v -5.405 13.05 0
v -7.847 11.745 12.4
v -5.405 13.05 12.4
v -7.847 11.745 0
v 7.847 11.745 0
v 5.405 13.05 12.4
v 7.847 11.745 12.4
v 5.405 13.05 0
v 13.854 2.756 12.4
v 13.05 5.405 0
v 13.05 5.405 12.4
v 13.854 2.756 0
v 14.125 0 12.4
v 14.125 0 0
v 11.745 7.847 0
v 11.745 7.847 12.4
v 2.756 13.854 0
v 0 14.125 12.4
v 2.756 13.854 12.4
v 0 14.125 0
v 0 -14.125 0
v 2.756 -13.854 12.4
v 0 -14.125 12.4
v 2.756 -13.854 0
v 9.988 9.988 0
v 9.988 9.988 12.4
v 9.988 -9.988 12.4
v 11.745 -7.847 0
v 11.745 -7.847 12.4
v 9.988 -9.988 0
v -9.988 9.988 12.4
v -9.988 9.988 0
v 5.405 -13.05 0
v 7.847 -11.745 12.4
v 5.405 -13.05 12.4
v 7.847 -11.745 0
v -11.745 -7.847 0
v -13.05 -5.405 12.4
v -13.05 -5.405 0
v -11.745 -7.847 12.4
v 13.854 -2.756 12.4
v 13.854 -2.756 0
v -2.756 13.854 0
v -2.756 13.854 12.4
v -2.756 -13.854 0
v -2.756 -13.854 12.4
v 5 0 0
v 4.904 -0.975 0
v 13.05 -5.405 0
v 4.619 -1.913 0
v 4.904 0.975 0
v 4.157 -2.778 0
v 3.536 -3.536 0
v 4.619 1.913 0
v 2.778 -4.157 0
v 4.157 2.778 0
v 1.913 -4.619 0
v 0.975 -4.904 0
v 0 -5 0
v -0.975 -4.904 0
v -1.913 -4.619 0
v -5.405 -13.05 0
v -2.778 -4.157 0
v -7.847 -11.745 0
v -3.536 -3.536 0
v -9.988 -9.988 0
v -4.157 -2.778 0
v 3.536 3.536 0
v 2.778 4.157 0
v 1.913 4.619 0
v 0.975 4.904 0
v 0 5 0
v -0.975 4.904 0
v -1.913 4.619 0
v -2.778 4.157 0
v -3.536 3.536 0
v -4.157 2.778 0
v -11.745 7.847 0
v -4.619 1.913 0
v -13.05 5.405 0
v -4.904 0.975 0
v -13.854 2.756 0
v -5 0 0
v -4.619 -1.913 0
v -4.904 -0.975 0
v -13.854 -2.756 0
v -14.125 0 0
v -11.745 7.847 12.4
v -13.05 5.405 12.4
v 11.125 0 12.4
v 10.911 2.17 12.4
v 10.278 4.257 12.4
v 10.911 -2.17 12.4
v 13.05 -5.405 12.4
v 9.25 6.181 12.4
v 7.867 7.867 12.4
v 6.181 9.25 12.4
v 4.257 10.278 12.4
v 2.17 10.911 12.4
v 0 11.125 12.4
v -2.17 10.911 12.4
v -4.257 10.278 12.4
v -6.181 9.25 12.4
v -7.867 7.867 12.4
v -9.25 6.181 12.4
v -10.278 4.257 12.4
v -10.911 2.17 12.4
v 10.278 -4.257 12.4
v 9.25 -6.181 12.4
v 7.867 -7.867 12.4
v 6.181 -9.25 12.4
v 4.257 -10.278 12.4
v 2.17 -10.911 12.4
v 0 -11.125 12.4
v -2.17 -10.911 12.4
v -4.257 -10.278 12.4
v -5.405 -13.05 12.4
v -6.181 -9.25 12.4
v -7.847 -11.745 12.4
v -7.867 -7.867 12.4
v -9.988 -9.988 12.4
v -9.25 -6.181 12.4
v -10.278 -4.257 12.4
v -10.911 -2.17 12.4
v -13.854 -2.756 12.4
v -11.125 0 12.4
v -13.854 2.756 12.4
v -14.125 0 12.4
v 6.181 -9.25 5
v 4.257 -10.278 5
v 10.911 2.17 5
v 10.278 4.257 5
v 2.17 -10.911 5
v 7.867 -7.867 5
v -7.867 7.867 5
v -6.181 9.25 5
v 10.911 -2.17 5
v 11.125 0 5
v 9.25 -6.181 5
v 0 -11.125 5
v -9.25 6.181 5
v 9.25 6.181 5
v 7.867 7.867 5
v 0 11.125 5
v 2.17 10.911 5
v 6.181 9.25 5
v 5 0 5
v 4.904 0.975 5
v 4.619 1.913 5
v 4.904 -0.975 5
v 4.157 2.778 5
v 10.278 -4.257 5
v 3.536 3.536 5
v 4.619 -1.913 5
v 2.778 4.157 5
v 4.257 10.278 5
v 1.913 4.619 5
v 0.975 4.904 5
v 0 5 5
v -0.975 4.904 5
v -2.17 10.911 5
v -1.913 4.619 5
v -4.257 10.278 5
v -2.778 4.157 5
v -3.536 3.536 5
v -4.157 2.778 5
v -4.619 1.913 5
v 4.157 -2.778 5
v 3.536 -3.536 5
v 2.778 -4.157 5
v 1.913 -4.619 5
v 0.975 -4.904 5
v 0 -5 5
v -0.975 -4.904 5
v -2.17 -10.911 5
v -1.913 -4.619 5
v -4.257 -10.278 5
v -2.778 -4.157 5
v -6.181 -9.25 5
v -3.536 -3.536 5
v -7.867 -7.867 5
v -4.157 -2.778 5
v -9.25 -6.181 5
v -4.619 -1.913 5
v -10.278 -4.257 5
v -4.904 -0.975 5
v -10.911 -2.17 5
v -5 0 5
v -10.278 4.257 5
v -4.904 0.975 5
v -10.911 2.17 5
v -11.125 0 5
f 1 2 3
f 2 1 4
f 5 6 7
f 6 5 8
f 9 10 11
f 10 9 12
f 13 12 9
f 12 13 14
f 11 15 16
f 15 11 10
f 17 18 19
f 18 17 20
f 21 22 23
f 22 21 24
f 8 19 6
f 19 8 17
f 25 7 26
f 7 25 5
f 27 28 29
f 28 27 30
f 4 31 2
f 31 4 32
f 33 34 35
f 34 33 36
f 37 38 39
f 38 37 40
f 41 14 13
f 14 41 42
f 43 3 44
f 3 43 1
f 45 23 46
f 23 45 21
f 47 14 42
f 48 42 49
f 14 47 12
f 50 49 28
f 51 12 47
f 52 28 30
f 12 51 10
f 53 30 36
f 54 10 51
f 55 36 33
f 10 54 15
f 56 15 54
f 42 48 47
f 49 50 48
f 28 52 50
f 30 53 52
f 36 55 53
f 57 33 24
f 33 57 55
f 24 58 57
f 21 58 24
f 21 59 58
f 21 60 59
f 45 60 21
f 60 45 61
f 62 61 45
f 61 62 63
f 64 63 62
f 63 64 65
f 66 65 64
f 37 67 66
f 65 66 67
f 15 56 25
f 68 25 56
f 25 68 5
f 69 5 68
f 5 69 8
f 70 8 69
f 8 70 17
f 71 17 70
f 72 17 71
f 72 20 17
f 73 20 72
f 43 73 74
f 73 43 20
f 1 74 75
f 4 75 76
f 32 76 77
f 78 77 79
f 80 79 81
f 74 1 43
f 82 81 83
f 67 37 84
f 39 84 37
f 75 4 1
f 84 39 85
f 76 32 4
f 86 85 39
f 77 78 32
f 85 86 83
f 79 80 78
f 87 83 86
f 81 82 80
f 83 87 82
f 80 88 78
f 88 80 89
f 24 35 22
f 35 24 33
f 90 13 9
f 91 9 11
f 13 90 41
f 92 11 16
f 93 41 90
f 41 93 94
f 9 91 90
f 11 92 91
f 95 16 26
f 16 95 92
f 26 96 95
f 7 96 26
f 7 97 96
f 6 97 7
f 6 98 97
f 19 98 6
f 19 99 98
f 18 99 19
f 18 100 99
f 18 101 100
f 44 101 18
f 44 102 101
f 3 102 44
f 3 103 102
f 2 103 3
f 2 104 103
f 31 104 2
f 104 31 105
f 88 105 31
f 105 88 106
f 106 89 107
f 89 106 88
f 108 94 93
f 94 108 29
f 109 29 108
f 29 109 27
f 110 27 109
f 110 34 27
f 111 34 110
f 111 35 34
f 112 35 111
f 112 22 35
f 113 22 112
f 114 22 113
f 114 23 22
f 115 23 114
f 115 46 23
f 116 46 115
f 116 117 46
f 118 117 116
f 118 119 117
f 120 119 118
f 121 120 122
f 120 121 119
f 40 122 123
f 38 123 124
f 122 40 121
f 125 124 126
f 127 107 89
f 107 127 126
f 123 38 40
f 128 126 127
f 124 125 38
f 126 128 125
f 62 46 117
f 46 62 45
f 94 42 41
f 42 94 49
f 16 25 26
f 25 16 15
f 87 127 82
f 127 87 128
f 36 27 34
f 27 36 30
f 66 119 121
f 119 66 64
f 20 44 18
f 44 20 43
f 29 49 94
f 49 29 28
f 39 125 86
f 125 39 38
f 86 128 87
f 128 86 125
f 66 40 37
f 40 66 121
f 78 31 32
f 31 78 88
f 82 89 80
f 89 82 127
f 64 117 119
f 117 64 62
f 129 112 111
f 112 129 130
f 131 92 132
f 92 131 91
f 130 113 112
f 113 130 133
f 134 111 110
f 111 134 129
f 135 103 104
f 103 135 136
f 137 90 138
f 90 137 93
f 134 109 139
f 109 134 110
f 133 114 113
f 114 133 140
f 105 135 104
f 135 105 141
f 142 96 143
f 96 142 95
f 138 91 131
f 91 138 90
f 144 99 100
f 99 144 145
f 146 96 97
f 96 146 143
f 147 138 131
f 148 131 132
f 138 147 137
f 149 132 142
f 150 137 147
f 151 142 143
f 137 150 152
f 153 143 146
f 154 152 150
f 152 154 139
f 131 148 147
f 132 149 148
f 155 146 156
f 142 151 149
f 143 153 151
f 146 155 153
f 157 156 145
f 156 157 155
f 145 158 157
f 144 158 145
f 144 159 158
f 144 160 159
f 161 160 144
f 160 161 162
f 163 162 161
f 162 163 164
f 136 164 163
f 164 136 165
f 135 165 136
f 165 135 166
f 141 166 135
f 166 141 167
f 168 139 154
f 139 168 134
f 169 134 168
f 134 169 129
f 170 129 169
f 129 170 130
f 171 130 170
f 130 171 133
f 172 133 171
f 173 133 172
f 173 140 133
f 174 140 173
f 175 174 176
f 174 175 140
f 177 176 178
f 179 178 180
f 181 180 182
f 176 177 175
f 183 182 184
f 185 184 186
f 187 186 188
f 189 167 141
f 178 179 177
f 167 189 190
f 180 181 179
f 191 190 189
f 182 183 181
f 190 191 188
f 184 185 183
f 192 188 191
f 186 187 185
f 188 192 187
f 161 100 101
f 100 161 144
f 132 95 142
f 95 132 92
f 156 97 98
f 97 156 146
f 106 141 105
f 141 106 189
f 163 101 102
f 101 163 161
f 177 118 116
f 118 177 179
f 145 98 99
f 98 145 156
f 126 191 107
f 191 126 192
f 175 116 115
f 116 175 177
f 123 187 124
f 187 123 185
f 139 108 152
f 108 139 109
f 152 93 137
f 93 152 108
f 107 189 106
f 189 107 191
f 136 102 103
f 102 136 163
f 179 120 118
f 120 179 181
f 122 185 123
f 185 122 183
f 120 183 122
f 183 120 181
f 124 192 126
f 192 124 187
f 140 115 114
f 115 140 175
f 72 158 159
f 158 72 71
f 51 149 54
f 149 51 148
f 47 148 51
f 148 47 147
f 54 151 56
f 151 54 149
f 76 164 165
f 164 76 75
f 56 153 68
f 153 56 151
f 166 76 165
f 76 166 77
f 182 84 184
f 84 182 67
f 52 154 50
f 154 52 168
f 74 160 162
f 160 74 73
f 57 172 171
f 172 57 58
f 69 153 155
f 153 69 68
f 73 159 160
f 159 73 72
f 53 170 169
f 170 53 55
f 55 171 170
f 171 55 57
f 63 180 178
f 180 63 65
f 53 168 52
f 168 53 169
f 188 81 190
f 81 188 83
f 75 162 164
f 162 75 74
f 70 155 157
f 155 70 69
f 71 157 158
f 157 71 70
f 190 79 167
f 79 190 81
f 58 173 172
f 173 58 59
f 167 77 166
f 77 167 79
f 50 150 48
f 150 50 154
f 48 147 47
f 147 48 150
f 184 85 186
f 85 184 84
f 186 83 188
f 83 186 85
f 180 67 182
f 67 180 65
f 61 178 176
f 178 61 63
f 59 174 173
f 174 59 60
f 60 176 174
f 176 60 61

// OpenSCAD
$fn = 32;

// ----------------------------------------------------------------------
// Bearing housing: seat for 608 (22 x 7 mm), 28.25 mm body
// ----------------------------------------------------------------------

// --- parameters (mm) ---
housing_d = 28.25;        // housing outside diameter
housing_h = 12.4;         // overall housing height
wall_t = 3;               // wall thickness
seat_d = 22.25;           // 608 seat, 0.25 mm clearance
seat_h = 7.4;             // pocket depth
shoulder = 5;             // shoulder under the bearing
pass_d = 10;              // shaft passage

module body() {
  cylinder(h = housing_h, d = housing_d);
}

difference() {
  union() {
    body();
  }
  translate([0, 0, housing_h - seat_h]) cylinder(h = seat_h + 1, d = seat_d);
  translate([0, 0, -1]) cylinder(h = housing_h - seat_h + 1, d = pass_d);
}
